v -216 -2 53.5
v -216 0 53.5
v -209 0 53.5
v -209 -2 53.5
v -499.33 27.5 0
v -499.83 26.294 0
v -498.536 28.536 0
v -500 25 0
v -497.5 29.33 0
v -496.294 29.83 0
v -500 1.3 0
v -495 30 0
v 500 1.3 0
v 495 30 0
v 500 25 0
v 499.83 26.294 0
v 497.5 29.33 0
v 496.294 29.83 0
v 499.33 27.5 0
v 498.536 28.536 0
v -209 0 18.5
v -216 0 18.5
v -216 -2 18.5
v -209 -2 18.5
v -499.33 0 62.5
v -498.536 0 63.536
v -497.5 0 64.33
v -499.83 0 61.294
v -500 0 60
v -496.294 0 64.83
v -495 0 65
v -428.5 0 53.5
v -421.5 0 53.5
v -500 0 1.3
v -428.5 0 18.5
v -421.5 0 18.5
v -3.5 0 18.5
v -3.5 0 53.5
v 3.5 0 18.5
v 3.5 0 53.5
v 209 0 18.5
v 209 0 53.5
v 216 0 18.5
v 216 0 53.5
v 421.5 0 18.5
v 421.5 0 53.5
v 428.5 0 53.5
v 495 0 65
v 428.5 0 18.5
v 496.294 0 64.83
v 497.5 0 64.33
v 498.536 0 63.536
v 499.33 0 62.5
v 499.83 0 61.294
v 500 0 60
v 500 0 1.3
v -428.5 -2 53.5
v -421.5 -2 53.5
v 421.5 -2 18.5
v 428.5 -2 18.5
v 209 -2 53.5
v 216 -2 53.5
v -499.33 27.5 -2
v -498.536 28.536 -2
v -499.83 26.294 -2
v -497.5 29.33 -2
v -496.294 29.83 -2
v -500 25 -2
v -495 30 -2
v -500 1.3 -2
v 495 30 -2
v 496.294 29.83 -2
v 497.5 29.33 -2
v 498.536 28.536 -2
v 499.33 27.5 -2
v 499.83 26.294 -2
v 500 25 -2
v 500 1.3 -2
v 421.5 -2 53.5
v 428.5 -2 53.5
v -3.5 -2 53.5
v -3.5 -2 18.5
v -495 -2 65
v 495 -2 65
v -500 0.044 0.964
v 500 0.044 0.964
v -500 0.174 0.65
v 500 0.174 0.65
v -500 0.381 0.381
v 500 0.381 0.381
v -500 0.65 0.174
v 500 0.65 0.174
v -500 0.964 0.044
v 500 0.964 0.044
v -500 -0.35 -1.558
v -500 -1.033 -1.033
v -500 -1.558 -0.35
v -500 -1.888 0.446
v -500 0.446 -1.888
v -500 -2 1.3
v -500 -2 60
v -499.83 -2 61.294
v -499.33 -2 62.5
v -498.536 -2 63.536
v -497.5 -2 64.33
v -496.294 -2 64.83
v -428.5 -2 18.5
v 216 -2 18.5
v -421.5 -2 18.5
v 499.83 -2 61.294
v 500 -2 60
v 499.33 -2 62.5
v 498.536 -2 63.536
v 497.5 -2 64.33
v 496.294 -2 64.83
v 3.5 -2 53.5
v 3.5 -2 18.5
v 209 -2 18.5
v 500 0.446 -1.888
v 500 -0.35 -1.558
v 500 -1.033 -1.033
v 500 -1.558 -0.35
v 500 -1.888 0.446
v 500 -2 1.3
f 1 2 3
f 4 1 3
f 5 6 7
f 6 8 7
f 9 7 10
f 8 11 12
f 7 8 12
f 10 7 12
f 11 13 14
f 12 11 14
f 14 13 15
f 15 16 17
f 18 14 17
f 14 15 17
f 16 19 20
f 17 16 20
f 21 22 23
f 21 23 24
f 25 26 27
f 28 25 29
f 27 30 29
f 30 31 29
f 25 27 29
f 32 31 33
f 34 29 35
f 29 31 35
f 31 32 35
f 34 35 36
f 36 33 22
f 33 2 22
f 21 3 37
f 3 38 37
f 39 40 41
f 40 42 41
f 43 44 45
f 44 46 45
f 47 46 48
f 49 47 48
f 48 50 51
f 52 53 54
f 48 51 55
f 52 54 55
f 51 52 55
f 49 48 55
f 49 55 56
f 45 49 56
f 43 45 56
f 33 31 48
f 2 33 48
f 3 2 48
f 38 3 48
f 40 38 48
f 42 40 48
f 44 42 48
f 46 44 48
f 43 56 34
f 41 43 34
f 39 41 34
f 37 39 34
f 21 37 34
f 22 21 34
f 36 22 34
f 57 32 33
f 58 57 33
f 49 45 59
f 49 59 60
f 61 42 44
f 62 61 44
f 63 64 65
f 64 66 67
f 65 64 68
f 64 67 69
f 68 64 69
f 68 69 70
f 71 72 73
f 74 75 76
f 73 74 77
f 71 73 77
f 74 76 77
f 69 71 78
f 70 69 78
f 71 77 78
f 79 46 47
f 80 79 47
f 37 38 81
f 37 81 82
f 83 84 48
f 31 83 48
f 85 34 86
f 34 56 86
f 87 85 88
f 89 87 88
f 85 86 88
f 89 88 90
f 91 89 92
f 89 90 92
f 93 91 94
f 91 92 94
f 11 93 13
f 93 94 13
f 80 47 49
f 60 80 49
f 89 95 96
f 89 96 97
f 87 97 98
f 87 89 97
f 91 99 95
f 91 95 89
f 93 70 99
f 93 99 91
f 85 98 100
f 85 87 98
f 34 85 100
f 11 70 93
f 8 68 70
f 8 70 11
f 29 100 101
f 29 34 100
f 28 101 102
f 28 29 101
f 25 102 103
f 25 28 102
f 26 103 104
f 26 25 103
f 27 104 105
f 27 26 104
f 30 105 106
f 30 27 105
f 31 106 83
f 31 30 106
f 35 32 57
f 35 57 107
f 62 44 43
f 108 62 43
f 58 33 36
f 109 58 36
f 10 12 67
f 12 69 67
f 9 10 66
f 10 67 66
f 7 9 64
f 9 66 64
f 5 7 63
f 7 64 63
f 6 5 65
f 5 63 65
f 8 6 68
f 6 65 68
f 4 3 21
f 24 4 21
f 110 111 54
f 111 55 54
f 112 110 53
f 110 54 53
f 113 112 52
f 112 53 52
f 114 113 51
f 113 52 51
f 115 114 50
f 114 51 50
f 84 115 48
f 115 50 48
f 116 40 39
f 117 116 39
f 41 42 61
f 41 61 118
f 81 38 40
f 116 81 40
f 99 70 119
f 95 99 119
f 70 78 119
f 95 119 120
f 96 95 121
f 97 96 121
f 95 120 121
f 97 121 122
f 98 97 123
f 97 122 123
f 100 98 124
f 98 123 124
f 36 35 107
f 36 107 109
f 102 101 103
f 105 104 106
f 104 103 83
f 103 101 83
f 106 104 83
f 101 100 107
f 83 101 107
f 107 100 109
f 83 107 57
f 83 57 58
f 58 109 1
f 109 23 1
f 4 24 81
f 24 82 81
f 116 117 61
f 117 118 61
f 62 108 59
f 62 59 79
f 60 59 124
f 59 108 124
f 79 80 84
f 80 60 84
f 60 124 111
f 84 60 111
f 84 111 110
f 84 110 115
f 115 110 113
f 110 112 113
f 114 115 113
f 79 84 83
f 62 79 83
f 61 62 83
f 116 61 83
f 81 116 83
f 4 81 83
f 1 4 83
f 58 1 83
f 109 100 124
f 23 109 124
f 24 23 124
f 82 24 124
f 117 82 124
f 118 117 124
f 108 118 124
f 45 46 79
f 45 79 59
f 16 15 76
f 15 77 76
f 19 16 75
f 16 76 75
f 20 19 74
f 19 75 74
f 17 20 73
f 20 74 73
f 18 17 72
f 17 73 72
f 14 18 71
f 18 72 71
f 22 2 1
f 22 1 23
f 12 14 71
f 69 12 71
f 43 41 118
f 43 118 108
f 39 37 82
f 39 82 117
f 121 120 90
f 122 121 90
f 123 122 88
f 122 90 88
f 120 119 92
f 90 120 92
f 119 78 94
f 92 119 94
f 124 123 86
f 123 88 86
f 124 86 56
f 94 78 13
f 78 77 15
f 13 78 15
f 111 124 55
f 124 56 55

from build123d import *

# Parameters (mm, degrees)
BASE_FLANGE1_DEPTH = 500
FILLET1_R          = 5
SKETCH2_W          = 7
SKETCH2_H          = 35
CUT_EXTRUDE1_DEPTH = 10


# Sheet-metal steps are written as plain solids
with BuildPart() as part:
    # Sketch1 → Base-Flange1 (new, symmetric)
    with BuildSketch(Plane(origin=(0, 0, 0), x_dir=(0, 0, -1), z_dir=(1, 0, 0))):
        with BuildLine():
            Line((-65, 0), (-1.3, 0))
            ThreePointArc((-1.3, 0), (-0.380761184, 0.380761184), (0, 1.3))
            Line((0, 1.3), (0, 30))
            Line((0, 30), (2, 30))
            Line((2, 30), (2, 1.3))
            ThreePointArc((2, 1.3), (1.033452378, -1.033452378), (-1.3, -2))
            Line((-1.3, -2), (-65, -2))
            Line((-65, -2), (-65, 0))
        make_face()
    extrude(amount=BASE_FLANGE1_DEPTH, both=True)

    # Fillet1
    fillet1_edges = [part.edges().sort_by_distance(p)[0] for p in [
        (500, -1, 65),
        (-500, -1, 65),
        (500, 30, -1),
        (-500, 30, -1),
    ]]
    fillet(fillet1_edges, radius=FILLET1_R)

    # Sketch2 → Cut-Extrude1 (cut)
    with BuildSketch(Plane(origin=(0, 0, 0), x_dir=(1, 0, 0), z_dir=(0, 1, 0))):
        with Locations((-425, -36)):
            Rectangle(SKETCH2_W, SKETCH2_H)
        with Locations((-212.5, -36)):
            Rectangle(SKETCH2_W, SKETCH2_H)
        with Locations((0, -36)):
            Rectangle(SKETCH2_W, SKETCH2_H)
        with Locations((212.5, -36)):
            Rectangle(SKETCH2_W, SKETCH2_H)
        with Locations((425, -36)):
            Rectangle(SKETCH2_W, SKETCH2_H)
    extrude(amount=-CUT_EXTRUDE1_DEPTH, mode=Mode.SUBTRACT)


solid = part.part
